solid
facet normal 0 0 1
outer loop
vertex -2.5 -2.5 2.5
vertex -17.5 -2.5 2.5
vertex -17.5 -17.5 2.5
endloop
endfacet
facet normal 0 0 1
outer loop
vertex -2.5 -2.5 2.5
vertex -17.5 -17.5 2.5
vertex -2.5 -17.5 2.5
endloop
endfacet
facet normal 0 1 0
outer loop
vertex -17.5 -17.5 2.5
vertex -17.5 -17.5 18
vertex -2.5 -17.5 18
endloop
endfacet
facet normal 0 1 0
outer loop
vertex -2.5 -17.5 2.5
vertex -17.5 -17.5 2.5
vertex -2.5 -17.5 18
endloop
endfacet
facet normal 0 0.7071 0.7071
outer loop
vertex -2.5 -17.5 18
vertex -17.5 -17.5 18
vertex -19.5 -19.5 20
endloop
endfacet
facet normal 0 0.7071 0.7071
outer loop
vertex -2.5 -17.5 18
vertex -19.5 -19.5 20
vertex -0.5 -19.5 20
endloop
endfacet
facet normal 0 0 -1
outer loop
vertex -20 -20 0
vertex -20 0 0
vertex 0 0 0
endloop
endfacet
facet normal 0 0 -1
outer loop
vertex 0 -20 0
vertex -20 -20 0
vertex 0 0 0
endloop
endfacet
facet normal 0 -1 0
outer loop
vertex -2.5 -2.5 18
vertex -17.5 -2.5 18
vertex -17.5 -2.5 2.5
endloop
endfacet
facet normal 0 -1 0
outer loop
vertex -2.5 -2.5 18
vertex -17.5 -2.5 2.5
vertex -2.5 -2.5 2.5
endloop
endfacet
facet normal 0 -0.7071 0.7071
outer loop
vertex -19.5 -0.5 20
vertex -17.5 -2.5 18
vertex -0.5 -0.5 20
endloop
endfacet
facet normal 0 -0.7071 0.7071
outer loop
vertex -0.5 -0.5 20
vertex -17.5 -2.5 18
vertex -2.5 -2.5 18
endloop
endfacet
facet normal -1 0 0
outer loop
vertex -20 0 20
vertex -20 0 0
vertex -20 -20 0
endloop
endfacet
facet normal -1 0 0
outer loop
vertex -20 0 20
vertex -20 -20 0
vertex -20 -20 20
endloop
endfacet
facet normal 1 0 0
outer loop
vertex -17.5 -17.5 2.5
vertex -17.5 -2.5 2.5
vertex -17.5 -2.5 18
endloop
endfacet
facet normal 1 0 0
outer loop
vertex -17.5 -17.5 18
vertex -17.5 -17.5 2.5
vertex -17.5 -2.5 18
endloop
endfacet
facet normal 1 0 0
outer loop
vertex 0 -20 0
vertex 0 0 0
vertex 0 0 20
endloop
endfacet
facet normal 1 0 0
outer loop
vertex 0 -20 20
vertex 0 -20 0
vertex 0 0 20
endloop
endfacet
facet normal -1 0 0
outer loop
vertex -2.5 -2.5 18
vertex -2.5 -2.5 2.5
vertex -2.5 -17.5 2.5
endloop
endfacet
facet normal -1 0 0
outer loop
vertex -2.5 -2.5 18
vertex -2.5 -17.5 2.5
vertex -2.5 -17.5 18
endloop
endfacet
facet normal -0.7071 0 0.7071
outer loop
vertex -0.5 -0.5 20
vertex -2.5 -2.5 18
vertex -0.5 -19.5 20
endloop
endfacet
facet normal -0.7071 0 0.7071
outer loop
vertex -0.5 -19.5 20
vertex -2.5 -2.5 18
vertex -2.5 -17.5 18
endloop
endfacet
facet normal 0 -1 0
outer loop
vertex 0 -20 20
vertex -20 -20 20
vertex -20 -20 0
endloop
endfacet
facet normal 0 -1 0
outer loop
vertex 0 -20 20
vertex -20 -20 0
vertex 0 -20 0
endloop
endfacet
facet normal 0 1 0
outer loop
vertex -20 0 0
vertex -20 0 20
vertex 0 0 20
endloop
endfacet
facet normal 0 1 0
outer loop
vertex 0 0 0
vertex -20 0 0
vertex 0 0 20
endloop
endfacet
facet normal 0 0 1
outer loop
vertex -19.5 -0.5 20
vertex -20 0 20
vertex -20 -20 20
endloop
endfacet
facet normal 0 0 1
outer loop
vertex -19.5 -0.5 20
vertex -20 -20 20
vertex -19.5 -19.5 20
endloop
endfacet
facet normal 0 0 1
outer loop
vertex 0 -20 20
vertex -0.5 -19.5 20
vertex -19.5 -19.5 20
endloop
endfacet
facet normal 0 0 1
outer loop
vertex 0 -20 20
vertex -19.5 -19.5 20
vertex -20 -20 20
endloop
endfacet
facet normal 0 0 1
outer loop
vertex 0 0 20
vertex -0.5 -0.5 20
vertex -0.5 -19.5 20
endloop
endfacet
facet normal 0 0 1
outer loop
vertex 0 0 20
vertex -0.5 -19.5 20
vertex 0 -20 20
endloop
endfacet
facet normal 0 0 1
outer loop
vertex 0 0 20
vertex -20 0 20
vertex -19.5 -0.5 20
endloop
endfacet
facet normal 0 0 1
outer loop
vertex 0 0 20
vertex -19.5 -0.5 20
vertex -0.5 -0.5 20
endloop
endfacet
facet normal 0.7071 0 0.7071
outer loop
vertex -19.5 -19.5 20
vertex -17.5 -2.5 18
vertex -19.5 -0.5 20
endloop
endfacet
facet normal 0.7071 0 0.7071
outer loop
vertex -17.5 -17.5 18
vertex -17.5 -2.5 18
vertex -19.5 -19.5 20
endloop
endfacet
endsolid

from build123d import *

# Parameters (mm, degrees)
F0_W     = 20
F0_H     = 20
F1_DEPTH = 20
F2_T     = -2.5
F3_SIZE  = 2


with BuildPart() as f1:
    # F0 (on Front) → F1 (new body)
    with BuildSketch(Plane.XZ):
        with Locations((-10, 10)):
            Rectangle(F0_W, F0_H)
    extrude(amount=F1_DEPTH)

    # F2
    f2_openings = [f1.faces().sort_by_distance(p)[0] for p in [
        (-10, -10, 20),
    ]]
    offset(amount=F2_T, openings=f2_openings)

    # F3
    f3_edges = [f1.edges().sort_by_distance(p)[0] for p in [
        (-17.5, -10, 20),
        (-10, -2.5, 20),
        (-2.5, -10, 20),
        (-10, -17.5, 20),
    ]]
    chamfer(f3_edges, length=F3_SIZE)


solid = f1.part
